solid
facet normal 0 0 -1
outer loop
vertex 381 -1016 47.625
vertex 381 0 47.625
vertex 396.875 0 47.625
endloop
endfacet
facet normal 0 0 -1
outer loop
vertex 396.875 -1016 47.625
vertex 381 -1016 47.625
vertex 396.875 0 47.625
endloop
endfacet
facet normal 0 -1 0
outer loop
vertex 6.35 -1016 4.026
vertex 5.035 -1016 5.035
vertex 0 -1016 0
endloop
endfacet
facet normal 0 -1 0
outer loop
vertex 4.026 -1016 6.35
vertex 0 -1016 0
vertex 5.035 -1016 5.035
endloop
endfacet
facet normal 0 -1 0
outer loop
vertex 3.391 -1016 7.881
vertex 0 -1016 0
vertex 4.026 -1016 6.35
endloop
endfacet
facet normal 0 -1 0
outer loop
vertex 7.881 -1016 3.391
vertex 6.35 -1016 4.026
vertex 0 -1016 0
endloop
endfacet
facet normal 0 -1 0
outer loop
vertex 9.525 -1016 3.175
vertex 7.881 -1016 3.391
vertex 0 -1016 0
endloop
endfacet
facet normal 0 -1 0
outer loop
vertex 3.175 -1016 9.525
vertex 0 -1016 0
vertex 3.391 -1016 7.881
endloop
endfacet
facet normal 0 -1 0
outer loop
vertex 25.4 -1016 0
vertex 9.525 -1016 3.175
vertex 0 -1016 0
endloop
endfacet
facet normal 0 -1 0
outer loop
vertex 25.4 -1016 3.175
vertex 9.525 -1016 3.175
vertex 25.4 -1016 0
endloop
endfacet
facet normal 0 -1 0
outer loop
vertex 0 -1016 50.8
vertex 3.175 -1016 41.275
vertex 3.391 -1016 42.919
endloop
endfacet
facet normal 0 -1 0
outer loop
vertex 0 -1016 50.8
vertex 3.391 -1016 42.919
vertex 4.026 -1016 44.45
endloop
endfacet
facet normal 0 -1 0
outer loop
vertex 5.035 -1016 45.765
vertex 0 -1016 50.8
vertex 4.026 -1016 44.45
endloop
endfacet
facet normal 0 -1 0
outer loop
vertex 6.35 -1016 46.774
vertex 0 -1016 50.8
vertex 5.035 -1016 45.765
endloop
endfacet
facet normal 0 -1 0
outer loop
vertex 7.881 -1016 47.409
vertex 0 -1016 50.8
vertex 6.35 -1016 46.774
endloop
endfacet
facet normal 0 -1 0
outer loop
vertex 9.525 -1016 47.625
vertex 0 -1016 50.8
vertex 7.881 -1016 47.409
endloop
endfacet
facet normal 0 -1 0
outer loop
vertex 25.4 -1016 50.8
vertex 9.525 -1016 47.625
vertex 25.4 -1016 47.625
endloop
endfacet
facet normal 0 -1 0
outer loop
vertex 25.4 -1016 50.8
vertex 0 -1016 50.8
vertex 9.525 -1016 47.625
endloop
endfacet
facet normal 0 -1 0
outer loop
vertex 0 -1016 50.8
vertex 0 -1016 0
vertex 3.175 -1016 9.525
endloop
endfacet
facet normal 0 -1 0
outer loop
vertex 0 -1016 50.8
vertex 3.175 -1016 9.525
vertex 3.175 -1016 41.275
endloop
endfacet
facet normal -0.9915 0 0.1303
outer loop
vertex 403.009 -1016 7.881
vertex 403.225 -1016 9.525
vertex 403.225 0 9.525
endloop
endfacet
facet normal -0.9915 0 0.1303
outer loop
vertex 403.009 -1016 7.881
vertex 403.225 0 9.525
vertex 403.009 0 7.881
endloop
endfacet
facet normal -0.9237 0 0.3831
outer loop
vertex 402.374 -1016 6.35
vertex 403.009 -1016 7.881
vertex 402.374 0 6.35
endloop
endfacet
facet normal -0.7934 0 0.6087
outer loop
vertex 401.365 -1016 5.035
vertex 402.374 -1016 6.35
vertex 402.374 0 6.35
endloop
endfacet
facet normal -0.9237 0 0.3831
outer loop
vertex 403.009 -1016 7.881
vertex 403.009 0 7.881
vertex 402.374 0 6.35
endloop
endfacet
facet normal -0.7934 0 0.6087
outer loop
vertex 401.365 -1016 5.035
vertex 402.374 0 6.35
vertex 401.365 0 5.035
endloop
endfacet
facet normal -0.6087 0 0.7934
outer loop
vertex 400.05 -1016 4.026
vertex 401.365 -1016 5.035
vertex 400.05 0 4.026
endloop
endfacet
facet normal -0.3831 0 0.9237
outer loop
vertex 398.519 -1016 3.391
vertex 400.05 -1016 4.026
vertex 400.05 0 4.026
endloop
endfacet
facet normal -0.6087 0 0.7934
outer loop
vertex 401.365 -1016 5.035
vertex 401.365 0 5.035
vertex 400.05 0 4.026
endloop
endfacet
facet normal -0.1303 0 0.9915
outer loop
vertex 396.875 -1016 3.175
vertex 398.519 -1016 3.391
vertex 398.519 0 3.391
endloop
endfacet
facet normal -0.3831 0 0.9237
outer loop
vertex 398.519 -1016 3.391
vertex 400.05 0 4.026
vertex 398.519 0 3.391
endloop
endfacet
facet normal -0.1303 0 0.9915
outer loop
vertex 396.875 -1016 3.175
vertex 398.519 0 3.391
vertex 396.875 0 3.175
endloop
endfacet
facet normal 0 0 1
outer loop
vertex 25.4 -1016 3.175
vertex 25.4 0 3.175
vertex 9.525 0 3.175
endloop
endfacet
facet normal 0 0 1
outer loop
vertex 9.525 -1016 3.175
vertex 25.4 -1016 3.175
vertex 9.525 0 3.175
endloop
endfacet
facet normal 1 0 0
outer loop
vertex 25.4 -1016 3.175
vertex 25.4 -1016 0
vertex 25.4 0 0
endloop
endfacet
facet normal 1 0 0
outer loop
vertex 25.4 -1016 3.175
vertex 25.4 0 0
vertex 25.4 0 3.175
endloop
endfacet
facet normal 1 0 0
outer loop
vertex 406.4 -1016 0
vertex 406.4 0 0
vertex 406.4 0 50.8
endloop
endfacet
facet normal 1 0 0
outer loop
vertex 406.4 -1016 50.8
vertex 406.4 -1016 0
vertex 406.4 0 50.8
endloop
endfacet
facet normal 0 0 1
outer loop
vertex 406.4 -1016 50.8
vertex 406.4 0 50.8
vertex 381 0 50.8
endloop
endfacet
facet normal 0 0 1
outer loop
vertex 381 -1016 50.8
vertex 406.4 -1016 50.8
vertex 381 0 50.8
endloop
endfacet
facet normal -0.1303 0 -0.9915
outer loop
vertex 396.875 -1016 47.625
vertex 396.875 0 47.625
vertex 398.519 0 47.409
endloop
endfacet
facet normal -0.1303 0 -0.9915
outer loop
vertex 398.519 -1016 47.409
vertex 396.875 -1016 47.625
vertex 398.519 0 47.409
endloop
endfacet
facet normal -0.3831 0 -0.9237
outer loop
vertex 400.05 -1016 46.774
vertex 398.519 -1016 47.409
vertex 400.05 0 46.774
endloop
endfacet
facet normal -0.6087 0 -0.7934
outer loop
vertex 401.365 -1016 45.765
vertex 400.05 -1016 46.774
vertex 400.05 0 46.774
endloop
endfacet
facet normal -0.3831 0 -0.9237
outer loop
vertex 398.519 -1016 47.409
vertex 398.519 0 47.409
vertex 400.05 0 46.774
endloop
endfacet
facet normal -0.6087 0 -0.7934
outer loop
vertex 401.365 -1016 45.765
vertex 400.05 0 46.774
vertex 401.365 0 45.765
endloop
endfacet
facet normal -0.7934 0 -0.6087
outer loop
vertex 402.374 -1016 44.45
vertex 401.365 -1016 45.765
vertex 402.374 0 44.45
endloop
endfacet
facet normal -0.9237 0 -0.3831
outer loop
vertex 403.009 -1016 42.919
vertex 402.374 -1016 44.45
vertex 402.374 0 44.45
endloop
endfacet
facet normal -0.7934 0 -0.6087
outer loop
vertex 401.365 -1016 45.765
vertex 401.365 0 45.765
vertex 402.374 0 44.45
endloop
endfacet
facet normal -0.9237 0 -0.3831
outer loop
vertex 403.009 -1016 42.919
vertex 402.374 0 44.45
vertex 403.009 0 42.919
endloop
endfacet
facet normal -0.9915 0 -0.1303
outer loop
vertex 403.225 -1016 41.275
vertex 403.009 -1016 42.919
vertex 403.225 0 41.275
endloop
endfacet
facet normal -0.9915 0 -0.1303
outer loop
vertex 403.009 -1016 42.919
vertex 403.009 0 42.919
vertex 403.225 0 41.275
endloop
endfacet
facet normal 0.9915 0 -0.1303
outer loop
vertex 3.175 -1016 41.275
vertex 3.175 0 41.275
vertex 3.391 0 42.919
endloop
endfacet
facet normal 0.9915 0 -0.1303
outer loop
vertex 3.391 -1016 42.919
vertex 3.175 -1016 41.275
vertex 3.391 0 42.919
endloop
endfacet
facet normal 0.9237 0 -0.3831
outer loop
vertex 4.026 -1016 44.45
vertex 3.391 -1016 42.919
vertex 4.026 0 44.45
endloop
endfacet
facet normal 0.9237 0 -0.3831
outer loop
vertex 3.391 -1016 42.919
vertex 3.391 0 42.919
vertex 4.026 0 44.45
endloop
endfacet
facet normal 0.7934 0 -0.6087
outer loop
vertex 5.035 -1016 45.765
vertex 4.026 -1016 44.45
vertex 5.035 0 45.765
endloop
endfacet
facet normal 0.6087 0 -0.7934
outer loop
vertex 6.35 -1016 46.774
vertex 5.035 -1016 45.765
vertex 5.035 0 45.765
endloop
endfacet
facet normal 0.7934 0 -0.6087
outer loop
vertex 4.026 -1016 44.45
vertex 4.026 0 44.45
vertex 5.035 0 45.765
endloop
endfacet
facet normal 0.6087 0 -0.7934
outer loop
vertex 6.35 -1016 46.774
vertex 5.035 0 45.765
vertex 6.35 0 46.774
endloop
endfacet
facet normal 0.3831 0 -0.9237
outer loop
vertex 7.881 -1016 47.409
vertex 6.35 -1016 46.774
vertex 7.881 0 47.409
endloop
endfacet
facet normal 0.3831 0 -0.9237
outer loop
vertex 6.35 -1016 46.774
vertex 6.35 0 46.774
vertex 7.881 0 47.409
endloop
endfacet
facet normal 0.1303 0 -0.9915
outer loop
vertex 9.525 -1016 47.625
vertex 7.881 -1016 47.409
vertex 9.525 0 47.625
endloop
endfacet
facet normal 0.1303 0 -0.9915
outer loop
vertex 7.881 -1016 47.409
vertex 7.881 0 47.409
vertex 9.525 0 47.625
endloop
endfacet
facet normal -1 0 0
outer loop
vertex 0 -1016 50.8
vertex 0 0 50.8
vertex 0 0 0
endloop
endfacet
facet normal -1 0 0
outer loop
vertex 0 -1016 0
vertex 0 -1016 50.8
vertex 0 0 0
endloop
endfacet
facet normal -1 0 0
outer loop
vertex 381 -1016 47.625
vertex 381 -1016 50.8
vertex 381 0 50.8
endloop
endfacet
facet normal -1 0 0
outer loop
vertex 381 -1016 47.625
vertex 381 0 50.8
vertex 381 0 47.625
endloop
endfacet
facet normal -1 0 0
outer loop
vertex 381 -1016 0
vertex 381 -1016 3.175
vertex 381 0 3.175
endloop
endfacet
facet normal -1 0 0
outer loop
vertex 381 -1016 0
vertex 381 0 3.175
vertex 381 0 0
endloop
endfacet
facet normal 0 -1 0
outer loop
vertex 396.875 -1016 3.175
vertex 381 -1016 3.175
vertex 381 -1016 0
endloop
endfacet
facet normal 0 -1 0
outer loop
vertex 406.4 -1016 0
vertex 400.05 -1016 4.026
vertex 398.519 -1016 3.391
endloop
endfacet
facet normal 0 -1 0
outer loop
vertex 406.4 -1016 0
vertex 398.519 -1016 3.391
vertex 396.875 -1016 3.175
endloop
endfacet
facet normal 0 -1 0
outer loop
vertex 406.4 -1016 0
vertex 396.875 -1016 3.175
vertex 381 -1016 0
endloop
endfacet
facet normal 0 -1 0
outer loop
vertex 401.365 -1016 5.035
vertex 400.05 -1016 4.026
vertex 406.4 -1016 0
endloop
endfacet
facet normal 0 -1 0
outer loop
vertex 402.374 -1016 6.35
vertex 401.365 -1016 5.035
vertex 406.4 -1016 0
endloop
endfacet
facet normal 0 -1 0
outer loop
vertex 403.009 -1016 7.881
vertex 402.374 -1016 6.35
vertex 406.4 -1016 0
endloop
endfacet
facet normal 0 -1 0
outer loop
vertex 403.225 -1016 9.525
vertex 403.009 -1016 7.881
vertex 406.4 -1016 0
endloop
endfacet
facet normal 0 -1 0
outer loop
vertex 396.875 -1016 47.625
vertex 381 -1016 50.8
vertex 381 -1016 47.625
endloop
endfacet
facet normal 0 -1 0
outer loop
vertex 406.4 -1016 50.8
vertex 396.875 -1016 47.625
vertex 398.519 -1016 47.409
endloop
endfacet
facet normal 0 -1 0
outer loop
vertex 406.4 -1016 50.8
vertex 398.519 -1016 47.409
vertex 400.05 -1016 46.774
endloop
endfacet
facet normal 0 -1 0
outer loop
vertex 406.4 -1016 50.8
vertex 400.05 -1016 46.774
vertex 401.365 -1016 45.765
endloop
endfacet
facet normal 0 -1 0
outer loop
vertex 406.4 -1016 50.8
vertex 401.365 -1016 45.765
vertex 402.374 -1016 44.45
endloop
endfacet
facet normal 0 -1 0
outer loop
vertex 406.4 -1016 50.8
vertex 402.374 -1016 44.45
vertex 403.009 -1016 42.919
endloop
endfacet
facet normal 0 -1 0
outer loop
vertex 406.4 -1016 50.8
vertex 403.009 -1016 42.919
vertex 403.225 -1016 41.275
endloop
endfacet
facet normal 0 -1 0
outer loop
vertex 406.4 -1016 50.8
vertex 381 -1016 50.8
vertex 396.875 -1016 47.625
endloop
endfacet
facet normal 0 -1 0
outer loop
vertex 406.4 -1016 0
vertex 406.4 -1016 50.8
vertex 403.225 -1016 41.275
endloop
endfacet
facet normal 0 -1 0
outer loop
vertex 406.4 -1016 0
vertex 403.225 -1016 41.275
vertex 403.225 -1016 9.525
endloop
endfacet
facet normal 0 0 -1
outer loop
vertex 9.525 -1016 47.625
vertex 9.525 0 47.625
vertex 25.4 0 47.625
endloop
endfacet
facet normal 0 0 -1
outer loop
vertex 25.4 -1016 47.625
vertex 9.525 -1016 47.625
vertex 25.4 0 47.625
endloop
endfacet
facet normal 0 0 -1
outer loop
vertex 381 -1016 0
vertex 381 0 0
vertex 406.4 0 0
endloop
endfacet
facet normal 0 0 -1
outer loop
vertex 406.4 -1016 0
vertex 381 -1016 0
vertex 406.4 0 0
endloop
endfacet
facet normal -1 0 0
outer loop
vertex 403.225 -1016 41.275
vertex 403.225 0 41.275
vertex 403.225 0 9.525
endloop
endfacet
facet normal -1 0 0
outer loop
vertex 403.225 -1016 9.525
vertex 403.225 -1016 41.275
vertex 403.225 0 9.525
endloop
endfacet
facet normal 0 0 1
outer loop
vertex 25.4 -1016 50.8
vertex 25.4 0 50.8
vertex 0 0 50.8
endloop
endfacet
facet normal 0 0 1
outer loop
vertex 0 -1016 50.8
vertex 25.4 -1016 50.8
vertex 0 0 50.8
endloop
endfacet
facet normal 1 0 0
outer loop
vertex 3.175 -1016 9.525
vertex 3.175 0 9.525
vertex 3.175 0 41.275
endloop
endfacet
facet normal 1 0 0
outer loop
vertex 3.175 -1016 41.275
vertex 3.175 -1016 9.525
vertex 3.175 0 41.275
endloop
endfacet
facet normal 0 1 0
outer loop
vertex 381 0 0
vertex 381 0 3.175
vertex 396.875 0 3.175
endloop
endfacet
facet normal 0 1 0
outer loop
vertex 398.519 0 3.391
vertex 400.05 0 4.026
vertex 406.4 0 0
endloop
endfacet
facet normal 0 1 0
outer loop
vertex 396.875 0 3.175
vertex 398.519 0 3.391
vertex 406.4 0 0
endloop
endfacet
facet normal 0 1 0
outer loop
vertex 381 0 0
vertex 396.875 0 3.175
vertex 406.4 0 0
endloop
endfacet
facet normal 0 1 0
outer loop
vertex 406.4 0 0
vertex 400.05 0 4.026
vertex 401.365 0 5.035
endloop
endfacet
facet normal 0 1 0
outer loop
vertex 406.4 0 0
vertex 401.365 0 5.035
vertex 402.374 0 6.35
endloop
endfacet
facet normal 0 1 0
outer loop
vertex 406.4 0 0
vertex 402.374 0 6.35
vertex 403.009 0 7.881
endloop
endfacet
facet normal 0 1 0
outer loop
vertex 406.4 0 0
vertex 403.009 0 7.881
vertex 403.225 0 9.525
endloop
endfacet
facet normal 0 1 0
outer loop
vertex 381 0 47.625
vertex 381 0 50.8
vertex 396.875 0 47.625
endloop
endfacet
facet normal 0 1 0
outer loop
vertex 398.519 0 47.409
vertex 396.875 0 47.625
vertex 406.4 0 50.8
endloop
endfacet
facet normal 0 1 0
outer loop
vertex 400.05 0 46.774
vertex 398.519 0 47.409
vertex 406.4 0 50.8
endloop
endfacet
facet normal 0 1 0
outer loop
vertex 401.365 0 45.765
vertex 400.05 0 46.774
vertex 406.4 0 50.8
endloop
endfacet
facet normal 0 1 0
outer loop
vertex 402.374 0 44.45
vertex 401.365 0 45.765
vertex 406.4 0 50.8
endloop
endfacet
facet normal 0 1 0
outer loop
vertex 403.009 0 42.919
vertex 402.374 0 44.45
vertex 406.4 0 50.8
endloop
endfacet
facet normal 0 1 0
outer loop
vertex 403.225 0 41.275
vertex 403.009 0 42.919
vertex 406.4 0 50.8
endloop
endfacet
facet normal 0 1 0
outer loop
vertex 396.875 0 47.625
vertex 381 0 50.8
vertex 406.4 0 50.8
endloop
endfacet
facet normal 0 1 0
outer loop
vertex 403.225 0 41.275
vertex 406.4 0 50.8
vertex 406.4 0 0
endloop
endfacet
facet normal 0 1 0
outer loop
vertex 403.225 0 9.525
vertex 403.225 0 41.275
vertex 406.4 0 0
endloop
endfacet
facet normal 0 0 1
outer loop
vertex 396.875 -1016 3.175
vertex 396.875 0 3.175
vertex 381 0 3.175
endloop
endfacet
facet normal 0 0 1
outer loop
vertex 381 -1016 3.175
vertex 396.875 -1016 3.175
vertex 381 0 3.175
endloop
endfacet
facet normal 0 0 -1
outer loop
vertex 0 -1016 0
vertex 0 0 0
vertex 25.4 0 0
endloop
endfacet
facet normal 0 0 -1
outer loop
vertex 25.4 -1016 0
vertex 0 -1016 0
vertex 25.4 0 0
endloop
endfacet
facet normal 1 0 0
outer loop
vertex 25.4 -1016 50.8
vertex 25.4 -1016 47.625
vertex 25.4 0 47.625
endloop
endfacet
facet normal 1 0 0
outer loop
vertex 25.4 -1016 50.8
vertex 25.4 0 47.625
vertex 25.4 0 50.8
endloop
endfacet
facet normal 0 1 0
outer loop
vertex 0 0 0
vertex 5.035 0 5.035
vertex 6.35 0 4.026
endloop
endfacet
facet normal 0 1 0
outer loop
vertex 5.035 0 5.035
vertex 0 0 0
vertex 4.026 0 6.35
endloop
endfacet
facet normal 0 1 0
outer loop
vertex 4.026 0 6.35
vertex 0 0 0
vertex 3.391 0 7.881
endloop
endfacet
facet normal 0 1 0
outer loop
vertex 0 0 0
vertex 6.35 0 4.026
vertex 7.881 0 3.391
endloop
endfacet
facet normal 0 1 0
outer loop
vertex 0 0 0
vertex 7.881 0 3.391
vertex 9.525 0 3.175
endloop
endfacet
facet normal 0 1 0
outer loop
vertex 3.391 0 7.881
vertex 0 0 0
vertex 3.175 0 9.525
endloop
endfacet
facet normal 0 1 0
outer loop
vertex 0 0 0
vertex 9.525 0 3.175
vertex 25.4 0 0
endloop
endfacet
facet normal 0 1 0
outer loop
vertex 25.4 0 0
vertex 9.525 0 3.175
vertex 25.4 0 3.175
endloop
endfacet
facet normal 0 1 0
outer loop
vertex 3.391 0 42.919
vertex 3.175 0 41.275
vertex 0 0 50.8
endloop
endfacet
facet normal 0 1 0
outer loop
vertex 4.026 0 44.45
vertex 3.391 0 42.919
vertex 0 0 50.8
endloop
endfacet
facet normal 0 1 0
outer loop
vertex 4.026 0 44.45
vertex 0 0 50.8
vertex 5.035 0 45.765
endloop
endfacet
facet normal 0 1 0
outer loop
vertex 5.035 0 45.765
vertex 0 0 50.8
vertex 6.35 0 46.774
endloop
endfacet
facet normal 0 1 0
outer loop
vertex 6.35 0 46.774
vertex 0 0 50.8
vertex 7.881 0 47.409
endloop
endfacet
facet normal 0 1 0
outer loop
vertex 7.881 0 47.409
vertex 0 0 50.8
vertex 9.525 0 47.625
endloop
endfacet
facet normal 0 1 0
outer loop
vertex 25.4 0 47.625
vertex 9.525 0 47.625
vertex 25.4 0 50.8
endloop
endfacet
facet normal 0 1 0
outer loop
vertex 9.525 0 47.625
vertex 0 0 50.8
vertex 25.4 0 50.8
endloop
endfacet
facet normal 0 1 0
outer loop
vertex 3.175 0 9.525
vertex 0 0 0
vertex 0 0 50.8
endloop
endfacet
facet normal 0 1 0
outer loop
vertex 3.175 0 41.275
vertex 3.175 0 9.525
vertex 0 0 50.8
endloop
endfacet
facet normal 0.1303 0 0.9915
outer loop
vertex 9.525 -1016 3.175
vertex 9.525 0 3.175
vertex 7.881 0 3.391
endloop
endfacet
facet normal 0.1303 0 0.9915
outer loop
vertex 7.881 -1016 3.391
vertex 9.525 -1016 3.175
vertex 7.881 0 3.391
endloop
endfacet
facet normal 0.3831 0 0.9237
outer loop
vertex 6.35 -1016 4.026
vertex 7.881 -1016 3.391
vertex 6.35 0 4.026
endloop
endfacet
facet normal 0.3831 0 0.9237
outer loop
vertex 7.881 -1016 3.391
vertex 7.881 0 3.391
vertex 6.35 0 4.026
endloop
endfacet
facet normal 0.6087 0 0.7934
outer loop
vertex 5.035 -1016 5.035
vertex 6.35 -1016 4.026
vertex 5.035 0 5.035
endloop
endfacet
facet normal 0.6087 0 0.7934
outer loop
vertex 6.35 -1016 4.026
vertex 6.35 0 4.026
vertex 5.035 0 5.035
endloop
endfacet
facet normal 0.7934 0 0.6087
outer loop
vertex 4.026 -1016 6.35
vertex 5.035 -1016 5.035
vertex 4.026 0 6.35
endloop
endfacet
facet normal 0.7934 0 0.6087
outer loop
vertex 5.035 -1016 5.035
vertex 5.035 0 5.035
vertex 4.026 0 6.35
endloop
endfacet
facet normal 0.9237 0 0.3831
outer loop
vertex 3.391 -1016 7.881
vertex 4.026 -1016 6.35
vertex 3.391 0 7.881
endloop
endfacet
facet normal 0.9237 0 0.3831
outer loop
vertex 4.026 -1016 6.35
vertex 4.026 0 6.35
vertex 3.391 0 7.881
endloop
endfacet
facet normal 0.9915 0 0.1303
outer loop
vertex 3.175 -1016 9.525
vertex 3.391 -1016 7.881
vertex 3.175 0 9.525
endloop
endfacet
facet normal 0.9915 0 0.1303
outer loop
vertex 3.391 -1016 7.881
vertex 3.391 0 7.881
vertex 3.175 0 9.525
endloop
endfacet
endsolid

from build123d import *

# Parameters (mm, degrees)
F1_DEPTH = 1016


with BuildPart() as f1:
    # F0 (on Front) → F1 (new body)
    with BuildSketch(Plane.XZ):
        with BuildLine():
            Line((0, 50.8), (0, 0))
            Line((0, 0), (25.4, 0))
            Line((25.4, 0), (25.4, 3.175))
            Line((25.4, 3.175), (9.525, 3.175))
            ThreePointArc((9.525, 3.175), (5.034872, 5.034872), (3.175, 9.525))
            Line((3.175, 9.525), (3.175, 41.275))
            ThreePointArc((3.175, 41.275), (5.034872, 45.765128), (9.525, 47.625))
            Line((9.525, 47.625), (25.4, 47.625))
            Line((25.4, 47.625), (25.4, 50.8))
            Line((25.4, 50.8), (0, 50.8))
        make_face()
        with BuildLine():
            Line((381, 0), (406.4, 0))
            Line((406.4, 0), (406.4, 50.8))
            Line((406.4, 50.8), (381, 50.8))
            Line((381, 50.8), (381, 47.625))
            Line((381, 47.625), (396.875, 47.625))
            ThreePointArc((396.875, 47.625), (401.365128, 45.765128), (403.225, 41.275))
            Line((403.225, 41.275), (403.225, 9.525))
            ThreePointArc((403.225, 9.525), (401.365128, 5.034872), (396.875, 3.175))
            Line((396.875, 3.175), (381, 3.175))
            Line((381, 3.175), (381, 0))
        make_face()
    extrude(amount=F1_DEPTH)


solid = f1.part
